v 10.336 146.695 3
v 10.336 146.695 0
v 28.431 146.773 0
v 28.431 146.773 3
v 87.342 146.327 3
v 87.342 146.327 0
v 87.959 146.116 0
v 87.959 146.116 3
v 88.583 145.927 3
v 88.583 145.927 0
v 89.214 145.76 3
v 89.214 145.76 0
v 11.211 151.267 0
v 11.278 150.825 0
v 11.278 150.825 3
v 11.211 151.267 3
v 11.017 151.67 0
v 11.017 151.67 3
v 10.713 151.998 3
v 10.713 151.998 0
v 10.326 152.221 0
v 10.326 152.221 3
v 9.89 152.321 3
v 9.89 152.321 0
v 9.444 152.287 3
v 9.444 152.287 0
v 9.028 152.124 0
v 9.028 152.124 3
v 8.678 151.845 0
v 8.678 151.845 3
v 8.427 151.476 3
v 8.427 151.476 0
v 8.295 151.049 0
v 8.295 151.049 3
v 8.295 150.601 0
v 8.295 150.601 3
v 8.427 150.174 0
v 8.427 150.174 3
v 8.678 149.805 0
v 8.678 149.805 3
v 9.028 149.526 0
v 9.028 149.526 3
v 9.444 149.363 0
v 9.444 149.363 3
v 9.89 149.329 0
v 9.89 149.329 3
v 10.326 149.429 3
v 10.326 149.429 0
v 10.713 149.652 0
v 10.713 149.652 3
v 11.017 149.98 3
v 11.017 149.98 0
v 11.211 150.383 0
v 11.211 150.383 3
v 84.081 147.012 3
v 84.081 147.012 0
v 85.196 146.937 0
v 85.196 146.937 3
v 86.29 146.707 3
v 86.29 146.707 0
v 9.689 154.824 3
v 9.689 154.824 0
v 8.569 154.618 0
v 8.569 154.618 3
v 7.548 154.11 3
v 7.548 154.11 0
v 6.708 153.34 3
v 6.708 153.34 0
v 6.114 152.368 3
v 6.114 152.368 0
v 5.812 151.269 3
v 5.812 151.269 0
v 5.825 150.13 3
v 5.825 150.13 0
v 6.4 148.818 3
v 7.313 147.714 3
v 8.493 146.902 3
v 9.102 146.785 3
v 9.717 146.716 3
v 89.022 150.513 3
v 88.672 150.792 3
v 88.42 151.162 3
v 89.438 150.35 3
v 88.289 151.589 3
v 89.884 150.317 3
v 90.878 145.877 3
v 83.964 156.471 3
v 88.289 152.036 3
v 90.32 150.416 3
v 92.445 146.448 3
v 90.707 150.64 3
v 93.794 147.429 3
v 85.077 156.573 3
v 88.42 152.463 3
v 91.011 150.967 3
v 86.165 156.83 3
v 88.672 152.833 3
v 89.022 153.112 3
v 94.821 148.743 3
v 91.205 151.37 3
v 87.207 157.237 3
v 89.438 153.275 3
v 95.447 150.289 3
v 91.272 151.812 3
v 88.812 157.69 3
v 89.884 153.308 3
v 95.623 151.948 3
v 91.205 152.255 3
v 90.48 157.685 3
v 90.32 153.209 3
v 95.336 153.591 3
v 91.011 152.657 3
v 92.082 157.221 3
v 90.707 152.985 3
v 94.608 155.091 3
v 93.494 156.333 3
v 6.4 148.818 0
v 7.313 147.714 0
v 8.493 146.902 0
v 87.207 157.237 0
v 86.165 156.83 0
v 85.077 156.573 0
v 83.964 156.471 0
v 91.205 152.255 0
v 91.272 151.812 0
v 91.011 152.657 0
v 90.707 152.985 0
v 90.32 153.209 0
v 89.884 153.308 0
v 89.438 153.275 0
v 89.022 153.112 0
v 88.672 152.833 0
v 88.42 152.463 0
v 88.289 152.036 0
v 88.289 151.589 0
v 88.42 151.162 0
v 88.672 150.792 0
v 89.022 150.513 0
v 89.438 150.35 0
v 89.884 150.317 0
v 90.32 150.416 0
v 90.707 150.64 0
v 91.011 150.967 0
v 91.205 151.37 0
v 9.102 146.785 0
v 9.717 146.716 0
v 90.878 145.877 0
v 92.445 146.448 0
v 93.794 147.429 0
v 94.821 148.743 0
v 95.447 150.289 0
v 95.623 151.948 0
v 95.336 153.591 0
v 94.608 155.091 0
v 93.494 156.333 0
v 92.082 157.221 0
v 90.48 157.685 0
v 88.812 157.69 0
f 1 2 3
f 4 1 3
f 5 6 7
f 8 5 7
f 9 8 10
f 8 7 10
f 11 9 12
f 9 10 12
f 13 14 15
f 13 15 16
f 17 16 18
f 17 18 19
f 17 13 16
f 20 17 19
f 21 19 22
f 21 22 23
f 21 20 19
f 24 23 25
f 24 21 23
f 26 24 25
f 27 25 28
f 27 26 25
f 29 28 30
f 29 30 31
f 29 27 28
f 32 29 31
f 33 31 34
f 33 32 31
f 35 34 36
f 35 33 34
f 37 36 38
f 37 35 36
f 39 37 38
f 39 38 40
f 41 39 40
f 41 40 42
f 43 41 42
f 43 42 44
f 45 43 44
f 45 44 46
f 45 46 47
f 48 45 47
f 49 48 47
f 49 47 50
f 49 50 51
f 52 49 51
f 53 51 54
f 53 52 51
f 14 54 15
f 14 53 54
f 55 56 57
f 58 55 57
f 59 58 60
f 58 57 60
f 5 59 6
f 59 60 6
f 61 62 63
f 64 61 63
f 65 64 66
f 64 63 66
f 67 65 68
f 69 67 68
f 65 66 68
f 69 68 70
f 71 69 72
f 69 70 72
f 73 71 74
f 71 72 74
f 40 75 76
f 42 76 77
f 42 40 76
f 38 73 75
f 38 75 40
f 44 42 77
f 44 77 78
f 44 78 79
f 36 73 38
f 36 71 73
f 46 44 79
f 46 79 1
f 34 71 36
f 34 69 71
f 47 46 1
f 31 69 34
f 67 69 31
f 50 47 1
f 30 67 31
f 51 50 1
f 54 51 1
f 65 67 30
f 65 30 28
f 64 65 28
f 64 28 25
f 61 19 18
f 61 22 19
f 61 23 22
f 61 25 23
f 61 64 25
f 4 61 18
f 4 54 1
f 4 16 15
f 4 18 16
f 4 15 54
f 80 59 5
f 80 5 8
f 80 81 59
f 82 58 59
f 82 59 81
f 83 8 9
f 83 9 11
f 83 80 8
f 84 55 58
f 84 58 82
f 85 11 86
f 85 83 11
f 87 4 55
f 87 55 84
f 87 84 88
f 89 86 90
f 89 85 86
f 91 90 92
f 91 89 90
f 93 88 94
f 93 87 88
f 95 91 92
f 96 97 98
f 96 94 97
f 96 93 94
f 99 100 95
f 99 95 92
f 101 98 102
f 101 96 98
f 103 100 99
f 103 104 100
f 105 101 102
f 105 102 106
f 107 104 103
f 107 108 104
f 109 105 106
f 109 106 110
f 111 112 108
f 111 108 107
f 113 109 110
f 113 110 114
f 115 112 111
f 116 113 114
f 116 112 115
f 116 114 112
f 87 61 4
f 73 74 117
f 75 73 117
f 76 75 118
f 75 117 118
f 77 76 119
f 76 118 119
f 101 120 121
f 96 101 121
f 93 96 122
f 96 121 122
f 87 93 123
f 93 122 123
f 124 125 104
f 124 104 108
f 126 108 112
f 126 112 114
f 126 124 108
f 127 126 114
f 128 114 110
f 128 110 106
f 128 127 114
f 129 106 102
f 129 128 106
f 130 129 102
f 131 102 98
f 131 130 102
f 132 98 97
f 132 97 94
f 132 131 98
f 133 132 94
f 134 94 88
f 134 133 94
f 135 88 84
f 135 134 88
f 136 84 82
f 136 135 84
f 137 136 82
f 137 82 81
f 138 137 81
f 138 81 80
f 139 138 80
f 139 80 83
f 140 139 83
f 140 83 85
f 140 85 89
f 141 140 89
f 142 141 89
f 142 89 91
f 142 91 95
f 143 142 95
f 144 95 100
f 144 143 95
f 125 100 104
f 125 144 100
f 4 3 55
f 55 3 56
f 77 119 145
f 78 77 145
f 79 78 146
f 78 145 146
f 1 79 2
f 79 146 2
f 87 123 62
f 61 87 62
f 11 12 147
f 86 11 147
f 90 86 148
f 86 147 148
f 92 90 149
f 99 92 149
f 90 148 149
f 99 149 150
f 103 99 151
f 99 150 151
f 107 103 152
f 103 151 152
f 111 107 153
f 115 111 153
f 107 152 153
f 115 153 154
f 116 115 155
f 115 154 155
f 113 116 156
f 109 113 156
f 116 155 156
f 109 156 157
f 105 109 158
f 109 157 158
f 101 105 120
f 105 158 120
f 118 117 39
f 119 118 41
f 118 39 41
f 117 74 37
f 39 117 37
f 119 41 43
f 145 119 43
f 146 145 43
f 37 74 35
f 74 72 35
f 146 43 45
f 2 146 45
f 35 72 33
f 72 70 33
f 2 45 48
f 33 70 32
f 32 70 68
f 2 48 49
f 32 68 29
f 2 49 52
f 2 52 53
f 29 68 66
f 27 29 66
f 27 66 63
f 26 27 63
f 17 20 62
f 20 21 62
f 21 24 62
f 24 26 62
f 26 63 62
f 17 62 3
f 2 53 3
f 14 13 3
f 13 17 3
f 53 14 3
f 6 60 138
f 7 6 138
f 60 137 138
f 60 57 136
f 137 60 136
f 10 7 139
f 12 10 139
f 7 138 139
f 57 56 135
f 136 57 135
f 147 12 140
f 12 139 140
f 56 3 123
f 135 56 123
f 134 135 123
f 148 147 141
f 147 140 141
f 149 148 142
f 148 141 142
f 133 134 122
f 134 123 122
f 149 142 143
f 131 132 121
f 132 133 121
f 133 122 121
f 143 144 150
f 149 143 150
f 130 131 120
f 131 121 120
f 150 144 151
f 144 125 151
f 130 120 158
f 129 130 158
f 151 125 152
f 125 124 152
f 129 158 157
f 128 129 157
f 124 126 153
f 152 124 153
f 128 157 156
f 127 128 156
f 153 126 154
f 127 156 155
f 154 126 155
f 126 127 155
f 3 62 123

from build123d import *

# Parameters (mm, degrees)
SKETCH_1_R      = 1.5
EXTRUDE_1_DEPTH = 3


with BuildPart() as part:
    # 草圖1 → 填料-伸長1 (new body)
    with BuildSketch(Plane.XY):
        with BuildLine():
            Line((28.43076164, 146.77282614), (84.081040564, 147.012256058))
            ThreePointArc((84.081040564, 147.012256058), (85.747384171, 146.841113393), (87.341537057, 146.326655031))
            ThreePointArc((87.341537057, 146.326655031), (88.27023729, 146.018781), (89.213720756, 145.759726003))
            ThreePointArc((89.213720756, 145.759726003), (95.537127916, 152.779296104), (87.206898507, 157.236550922))
            ThreePointArc((87.206898507, 157.236550922), (85.625904315, 156.682898569), (83.964278534, 156.470593769))
            Line((83.964278534, 156.470593769), (9.689328559, 154.823969204))
            ThreePointArc((9.689328559, 154.823969204), (6.708309072, 153.340450311), (5.825145652, 150.129947568))
            ThreePointArc((5.825145652, 150.129947568), (6.818352081, 148.234093963), (8.49347494, 146.901921561))
            ThreePointArc((8.49347494, 146.901921561), (9.408892458, 146.744827981), (10.336347773, 146.694885369))
            Line((10.336347773, 146.694885369), (28.43076164, 146.77282614))
        make_face()
        with Locations((89.77184724, 151.812467685)):
            Circle(SKETCH_1_R, mode=Mode.SUBTRACT)
        with Locations((9.777984027, 150.8249518)):
            Circle(SKETCH_1_R, mode=Mode.SUBTRACT)
    extrude(amount=EXTRUDE_1_DEPTH)


solid = part.part
